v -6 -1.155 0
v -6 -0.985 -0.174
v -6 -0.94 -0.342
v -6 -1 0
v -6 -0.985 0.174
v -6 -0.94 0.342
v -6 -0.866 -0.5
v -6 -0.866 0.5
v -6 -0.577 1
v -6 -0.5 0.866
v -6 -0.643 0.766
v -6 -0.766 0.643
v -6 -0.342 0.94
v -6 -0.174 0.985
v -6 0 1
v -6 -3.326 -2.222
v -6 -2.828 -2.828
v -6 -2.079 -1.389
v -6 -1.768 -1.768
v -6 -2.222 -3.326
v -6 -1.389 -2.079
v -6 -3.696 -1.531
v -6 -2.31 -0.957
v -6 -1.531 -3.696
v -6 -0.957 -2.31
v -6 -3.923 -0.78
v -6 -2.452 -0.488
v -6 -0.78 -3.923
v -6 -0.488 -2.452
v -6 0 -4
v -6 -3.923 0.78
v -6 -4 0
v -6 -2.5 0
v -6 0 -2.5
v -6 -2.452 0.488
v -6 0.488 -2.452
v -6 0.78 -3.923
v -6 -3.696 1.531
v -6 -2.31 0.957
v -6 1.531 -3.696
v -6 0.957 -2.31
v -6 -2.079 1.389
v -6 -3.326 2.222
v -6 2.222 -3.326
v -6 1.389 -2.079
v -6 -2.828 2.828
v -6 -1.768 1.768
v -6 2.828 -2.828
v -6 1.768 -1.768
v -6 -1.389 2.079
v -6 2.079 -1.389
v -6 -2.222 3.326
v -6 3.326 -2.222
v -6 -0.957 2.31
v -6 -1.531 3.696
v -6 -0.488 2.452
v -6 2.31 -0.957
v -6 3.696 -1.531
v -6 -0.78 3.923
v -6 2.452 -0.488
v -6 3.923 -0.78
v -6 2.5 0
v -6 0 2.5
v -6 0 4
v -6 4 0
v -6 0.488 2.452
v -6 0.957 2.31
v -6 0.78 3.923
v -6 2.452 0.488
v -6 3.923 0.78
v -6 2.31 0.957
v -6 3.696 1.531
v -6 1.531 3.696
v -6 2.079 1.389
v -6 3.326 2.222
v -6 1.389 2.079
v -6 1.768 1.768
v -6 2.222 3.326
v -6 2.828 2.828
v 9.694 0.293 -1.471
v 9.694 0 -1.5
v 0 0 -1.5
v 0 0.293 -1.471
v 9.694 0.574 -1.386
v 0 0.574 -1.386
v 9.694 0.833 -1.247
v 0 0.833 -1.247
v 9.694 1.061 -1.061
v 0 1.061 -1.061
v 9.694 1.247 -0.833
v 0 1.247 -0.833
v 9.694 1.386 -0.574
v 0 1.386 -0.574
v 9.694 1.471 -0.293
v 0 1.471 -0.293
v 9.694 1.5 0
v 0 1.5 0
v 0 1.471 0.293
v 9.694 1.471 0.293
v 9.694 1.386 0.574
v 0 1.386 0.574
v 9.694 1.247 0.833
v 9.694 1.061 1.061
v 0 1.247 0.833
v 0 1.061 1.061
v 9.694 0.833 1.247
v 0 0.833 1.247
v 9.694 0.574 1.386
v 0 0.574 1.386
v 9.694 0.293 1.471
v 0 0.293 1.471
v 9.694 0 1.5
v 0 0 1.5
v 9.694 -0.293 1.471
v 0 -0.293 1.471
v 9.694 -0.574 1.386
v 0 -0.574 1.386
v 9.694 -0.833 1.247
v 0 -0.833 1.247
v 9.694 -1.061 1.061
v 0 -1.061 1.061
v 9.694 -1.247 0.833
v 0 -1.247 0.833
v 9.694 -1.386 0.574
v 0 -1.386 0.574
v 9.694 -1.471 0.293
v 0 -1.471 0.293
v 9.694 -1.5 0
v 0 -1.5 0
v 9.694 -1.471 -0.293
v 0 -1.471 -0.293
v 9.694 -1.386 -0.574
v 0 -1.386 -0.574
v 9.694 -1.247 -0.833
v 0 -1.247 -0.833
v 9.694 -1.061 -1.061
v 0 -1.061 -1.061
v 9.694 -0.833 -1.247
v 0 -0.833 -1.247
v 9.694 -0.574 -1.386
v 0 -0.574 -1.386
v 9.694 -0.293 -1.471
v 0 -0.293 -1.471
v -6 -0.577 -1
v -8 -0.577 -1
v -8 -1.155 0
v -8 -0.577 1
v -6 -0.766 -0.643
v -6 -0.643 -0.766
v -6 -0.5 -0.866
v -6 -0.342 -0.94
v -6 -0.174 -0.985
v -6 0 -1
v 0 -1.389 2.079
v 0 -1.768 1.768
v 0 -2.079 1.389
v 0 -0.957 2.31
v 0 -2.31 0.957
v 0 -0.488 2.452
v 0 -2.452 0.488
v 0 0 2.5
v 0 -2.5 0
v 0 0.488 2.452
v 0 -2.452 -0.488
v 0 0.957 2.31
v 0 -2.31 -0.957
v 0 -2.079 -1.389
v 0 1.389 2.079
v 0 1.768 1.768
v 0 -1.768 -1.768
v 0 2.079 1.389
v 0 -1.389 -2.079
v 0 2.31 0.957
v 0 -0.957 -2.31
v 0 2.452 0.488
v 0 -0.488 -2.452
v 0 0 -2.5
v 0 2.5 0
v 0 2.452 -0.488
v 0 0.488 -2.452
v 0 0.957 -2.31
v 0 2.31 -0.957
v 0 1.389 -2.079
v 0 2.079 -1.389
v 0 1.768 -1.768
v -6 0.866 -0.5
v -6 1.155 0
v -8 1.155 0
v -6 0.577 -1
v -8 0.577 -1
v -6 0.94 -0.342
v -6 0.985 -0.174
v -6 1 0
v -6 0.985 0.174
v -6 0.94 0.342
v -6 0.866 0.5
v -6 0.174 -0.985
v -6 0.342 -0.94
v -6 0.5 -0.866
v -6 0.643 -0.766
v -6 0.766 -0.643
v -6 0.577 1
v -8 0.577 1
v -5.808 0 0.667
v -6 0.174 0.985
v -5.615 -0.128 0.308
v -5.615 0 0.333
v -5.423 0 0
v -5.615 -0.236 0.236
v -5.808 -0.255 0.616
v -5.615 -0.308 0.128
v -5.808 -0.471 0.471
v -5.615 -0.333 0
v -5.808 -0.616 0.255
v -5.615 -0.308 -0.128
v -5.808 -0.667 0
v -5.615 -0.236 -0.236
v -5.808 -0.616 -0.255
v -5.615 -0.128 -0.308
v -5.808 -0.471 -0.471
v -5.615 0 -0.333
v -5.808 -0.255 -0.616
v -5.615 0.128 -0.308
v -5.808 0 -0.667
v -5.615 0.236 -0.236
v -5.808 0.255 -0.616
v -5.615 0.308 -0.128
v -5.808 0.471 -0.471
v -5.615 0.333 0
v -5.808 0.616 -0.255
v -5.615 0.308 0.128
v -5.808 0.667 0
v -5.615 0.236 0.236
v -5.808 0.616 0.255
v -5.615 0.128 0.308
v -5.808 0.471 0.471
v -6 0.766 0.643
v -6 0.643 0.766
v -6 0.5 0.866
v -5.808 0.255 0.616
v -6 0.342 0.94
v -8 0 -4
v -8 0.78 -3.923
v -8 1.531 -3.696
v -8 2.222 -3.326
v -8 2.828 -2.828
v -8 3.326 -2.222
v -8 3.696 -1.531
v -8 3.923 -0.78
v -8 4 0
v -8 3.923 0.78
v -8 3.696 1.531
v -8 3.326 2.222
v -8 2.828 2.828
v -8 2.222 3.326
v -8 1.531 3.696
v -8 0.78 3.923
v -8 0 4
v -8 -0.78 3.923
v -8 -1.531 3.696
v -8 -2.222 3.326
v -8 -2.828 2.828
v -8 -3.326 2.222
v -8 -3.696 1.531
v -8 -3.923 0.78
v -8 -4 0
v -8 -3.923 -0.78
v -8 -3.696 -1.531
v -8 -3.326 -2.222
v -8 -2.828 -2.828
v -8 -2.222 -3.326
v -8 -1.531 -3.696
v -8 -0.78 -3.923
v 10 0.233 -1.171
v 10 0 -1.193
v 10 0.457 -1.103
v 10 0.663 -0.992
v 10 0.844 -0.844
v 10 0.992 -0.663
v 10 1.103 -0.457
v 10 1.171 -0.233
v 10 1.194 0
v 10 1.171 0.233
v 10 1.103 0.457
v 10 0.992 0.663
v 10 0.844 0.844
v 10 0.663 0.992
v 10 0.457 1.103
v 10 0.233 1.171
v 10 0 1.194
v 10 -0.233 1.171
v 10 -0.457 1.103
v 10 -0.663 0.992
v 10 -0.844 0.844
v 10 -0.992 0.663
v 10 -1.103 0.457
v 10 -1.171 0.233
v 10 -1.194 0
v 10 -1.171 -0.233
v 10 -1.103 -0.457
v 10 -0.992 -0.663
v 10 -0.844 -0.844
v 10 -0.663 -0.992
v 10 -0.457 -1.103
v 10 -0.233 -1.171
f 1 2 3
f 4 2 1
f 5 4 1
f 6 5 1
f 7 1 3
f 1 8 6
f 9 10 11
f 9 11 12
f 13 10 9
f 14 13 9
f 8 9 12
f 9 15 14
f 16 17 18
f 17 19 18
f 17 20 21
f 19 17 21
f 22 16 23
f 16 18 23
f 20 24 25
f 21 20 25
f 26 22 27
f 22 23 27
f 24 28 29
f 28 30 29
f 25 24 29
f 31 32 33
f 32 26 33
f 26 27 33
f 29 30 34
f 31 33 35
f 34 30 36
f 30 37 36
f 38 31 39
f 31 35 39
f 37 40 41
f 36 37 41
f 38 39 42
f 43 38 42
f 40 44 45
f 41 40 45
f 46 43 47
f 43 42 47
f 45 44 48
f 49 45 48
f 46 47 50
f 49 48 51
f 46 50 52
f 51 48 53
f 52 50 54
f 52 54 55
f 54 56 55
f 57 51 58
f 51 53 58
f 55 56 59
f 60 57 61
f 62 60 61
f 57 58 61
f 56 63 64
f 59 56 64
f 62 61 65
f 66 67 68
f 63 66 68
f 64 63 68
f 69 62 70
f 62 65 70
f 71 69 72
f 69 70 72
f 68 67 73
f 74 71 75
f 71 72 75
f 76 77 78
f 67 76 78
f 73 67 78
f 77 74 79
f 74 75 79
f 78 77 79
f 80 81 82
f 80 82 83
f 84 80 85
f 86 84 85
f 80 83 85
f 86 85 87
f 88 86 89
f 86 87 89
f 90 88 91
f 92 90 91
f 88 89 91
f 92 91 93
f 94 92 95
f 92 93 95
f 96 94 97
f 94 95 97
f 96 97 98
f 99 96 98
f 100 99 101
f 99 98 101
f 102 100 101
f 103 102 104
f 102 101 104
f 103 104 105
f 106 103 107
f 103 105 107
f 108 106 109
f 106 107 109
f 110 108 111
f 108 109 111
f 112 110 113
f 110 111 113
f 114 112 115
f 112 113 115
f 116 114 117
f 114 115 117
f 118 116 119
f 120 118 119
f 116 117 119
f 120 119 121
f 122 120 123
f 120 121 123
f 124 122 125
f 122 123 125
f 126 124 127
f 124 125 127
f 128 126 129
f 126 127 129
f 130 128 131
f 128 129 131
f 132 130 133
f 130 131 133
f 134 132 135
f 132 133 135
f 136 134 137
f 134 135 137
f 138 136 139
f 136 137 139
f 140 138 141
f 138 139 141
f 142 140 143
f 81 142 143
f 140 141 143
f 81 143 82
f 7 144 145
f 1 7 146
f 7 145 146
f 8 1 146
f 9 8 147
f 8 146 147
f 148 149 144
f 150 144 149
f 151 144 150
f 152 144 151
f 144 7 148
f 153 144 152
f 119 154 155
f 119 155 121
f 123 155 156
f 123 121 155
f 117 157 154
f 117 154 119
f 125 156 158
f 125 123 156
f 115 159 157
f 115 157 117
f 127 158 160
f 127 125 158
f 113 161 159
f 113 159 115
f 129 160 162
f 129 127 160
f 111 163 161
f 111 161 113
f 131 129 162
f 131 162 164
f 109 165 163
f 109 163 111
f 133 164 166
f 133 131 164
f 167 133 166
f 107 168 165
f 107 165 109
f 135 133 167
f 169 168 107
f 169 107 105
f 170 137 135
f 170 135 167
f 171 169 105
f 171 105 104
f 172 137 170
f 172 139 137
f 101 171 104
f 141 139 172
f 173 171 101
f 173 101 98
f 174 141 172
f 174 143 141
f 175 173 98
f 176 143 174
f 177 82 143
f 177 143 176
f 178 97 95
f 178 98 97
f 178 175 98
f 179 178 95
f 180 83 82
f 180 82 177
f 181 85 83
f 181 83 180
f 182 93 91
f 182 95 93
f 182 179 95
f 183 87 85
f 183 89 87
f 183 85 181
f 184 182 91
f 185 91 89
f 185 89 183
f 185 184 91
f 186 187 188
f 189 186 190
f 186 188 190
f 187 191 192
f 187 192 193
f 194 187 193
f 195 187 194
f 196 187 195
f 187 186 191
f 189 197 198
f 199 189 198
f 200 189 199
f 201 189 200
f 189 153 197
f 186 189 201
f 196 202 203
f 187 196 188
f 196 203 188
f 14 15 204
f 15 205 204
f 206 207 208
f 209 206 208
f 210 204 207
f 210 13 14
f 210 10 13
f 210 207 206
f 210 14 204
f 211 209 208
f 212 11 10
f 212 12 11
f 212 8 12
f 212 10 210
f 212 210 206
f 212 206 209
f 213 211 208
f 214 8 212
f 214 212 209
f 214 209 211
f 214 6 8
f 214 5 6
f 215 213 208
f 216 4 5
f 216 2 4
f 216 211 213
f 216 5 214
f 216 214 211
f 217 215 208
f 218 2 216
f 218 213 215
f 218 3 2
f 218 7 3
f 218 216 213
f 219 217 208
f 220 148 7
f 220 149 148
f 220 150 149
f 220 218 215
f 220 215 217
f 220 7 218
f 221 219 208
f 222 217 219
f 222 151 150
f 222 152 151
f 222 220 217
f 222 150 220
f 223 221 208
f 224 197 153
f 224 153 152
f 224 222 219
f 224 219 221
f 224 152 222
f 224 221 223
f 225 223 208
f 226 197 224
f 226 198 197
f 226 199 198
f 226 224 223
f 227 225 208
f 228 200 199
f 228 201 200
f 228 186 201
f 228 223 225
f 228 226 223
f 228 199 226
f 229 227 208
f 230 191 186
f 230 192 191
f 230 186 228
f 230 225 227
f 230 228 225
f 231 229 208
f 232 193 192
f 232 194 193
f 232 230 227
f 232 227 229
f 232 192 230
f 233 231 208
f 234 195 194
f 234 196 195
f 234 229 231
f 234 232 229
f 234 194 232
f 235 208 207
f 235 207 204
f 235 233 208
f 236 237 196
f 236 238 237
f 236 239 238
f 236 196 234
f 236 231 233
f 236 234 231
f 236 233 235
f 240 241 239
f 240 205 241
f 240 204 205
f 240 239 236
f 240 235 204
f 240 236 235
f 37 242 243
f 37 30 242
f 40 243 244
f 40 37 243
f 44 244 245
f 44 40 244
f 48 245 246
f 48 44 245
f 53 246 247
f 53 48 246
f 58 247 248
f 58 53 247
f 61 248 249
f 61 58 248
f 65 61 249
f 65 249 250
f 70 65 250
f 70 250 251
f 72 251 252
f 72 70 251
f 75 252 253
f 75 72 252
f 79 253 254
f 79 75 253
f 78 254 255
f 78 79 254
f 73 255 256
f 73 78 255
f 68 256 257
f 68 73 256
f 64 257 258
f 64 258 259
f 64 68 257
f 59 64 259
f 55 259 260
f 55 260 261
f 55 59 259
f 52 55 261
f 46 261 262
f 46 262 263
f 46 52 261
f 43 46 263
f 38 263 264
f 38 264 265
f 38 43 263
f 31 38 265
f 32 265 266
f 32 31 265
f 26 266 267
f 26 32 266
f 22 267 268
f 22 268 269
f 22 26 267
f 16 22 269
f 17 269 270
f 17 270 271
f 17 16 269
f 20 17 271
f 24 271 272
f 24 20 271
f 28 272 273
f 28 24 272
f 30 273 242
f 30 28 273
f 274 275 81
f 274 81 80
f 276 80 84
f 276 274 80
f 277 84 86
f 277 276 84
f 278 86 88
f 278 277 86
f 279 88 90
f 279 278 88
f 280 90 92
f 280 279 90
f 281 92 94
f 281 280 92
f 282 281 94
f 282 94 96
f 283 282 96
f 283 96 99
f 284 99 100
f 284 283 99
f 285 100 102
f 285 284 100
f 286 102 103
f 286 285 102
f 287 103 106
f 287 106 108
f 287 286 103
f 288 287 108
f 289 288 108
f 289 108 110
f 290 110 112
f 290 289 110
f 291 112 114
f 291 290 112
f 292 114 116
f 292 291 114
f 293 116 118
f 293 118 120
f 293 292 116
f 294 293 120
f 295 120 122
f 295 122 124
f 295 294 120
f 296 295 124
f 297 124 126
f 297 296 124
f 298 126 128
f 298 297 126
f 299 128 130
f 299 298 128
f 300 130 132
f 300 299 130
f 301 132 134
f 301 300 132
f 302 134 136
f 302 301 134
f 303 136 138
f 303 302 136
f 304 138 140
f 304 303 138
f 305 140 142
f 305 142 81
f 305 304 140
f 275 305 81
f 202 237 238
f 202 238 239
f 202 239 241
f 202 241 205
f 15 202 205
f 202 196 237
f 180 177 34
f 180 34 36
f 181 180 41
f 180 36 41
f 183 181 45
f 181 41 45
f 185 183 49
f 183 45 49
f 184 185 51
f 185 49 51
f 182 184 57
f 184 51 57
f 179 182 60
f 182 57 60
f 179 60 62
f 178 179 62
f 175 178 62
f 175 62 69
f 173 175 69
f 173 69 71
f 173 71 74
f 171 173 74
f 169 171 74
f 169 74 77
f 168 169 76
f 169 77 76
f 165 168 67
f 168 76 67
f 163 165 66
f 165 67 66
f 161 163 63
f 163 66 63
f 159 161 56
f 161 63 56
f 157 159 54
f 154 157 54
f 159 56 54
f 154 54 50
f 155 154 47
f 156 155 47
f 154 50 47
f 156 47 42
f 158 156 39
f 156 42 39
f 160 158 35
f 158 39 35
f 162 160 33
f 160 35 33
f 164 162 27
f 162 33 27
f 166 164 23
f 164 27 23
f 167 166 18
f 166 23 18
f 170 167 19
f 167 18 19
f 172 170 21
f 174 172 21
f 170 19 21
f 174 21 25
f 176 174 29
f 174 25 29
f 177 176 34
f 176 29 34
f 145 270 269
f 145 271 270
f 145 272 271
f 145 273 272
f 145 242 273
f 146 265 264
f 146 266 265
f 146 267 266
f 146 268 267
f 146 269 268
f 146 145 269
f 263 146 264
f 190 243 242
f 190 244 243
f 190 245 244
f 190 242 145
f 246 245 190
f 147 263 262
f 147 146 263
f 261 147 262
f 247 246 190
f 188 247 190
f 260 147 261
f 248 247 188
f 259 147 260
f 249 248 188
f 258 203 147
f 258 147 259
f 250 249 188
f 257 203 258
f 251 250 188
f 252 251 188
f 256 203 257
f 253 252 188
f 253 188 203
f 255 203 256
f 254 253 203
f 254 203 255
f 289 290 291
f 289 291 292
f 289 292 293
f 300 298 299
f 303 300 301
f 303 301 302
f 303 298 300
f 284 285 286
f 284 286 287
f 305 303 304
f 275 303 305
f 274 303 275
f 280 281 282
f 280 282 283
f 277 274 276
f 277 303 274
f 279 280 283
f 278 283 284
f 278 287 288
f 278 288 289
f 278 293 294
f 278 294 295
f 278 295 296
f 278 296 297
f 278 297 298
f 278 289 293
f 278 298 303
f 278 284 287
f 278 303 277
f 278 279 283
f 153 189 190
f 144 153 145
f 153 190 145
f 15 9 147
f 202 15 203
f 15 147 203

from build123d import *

# Parameters (mm, degrees)
SKETCH1_W           = 2
SKETCH1_H           = 4
SKETCH2_R           = 2.5
BOSS_EXTRUDE1_DEPTH = 6
SKETCH3_R           = 1.5
BOSS_EXTRUDE2_DEPTH = 10
CUT_EXTRUDE1_DEPTH  = 2
CHAMFER1_SIZE       = 0.3065


with BuildPart() as part:
    # Sketch1 → Revolve1 (revolve)
    with BuildSketch(Plane.XY):
        with Locations((-7, 2)):
            Rectangle(SKETCH1_W, SKETCH1_H)
    revolve(axis=Axis((-8, 0, 0), (1, 0, 0)))

    # Sketch2 → Boss-Extrude1 (add)
    with BuildSketch(Plane(origin=(-6, 0, 0), x_dir=(0, 0, -1), z_dir=(1, 0, 0))):
        Circle(SKETCH2_R)
    extrude(amount=BOSS_EXTRUDE1_DEPTH)

    # Sketch3 → Boss-Extrude2 (add)
    with BuildSketch(Plane(origin=(0, 0, 0), x_dir=(0, 0, -1), z_dir=(1, 0, 0))):
        Circle(SKETCH3_R)
    extrude(amount=BOSS_EXTRUDE2_DEPTH)

    # Sketch4 → Cut-Extrude1 (cut)
    with BuildSketch(Plane.ZY.offset(8)):
        Polygon((0, -1.154700538), (1, -0.577350269), (1, 0.577350269), (0, 1.154700538), (-1, 0.577350269), (-1, -0.577350269), align=None)
    extrude(amount=-CUT_EXTRUDE1_DEPTH, mode=Mode.SUBTRACT)

    # Sketch5 → Cut-Revolve1 (revolve, cut)
    with BuildSketch(Plane.XY):
        Polygon((-6, 1), (-6, 0), (-5.422649731, 0), align=None)
    revolve(axis=Axis((-6.000025, 0, 0), (1, 0, 0)), mode=Mode.SUBTRACT)

    # Chamfer1
    chamfer1_edges = [part.edges().sort_by_distance(p)[0] for p in [
        (10, 0, 1.5),
    ]]
    chamfer(chamfer1_edges, length=CHAMFER1_SIZE)


solid = part.part
